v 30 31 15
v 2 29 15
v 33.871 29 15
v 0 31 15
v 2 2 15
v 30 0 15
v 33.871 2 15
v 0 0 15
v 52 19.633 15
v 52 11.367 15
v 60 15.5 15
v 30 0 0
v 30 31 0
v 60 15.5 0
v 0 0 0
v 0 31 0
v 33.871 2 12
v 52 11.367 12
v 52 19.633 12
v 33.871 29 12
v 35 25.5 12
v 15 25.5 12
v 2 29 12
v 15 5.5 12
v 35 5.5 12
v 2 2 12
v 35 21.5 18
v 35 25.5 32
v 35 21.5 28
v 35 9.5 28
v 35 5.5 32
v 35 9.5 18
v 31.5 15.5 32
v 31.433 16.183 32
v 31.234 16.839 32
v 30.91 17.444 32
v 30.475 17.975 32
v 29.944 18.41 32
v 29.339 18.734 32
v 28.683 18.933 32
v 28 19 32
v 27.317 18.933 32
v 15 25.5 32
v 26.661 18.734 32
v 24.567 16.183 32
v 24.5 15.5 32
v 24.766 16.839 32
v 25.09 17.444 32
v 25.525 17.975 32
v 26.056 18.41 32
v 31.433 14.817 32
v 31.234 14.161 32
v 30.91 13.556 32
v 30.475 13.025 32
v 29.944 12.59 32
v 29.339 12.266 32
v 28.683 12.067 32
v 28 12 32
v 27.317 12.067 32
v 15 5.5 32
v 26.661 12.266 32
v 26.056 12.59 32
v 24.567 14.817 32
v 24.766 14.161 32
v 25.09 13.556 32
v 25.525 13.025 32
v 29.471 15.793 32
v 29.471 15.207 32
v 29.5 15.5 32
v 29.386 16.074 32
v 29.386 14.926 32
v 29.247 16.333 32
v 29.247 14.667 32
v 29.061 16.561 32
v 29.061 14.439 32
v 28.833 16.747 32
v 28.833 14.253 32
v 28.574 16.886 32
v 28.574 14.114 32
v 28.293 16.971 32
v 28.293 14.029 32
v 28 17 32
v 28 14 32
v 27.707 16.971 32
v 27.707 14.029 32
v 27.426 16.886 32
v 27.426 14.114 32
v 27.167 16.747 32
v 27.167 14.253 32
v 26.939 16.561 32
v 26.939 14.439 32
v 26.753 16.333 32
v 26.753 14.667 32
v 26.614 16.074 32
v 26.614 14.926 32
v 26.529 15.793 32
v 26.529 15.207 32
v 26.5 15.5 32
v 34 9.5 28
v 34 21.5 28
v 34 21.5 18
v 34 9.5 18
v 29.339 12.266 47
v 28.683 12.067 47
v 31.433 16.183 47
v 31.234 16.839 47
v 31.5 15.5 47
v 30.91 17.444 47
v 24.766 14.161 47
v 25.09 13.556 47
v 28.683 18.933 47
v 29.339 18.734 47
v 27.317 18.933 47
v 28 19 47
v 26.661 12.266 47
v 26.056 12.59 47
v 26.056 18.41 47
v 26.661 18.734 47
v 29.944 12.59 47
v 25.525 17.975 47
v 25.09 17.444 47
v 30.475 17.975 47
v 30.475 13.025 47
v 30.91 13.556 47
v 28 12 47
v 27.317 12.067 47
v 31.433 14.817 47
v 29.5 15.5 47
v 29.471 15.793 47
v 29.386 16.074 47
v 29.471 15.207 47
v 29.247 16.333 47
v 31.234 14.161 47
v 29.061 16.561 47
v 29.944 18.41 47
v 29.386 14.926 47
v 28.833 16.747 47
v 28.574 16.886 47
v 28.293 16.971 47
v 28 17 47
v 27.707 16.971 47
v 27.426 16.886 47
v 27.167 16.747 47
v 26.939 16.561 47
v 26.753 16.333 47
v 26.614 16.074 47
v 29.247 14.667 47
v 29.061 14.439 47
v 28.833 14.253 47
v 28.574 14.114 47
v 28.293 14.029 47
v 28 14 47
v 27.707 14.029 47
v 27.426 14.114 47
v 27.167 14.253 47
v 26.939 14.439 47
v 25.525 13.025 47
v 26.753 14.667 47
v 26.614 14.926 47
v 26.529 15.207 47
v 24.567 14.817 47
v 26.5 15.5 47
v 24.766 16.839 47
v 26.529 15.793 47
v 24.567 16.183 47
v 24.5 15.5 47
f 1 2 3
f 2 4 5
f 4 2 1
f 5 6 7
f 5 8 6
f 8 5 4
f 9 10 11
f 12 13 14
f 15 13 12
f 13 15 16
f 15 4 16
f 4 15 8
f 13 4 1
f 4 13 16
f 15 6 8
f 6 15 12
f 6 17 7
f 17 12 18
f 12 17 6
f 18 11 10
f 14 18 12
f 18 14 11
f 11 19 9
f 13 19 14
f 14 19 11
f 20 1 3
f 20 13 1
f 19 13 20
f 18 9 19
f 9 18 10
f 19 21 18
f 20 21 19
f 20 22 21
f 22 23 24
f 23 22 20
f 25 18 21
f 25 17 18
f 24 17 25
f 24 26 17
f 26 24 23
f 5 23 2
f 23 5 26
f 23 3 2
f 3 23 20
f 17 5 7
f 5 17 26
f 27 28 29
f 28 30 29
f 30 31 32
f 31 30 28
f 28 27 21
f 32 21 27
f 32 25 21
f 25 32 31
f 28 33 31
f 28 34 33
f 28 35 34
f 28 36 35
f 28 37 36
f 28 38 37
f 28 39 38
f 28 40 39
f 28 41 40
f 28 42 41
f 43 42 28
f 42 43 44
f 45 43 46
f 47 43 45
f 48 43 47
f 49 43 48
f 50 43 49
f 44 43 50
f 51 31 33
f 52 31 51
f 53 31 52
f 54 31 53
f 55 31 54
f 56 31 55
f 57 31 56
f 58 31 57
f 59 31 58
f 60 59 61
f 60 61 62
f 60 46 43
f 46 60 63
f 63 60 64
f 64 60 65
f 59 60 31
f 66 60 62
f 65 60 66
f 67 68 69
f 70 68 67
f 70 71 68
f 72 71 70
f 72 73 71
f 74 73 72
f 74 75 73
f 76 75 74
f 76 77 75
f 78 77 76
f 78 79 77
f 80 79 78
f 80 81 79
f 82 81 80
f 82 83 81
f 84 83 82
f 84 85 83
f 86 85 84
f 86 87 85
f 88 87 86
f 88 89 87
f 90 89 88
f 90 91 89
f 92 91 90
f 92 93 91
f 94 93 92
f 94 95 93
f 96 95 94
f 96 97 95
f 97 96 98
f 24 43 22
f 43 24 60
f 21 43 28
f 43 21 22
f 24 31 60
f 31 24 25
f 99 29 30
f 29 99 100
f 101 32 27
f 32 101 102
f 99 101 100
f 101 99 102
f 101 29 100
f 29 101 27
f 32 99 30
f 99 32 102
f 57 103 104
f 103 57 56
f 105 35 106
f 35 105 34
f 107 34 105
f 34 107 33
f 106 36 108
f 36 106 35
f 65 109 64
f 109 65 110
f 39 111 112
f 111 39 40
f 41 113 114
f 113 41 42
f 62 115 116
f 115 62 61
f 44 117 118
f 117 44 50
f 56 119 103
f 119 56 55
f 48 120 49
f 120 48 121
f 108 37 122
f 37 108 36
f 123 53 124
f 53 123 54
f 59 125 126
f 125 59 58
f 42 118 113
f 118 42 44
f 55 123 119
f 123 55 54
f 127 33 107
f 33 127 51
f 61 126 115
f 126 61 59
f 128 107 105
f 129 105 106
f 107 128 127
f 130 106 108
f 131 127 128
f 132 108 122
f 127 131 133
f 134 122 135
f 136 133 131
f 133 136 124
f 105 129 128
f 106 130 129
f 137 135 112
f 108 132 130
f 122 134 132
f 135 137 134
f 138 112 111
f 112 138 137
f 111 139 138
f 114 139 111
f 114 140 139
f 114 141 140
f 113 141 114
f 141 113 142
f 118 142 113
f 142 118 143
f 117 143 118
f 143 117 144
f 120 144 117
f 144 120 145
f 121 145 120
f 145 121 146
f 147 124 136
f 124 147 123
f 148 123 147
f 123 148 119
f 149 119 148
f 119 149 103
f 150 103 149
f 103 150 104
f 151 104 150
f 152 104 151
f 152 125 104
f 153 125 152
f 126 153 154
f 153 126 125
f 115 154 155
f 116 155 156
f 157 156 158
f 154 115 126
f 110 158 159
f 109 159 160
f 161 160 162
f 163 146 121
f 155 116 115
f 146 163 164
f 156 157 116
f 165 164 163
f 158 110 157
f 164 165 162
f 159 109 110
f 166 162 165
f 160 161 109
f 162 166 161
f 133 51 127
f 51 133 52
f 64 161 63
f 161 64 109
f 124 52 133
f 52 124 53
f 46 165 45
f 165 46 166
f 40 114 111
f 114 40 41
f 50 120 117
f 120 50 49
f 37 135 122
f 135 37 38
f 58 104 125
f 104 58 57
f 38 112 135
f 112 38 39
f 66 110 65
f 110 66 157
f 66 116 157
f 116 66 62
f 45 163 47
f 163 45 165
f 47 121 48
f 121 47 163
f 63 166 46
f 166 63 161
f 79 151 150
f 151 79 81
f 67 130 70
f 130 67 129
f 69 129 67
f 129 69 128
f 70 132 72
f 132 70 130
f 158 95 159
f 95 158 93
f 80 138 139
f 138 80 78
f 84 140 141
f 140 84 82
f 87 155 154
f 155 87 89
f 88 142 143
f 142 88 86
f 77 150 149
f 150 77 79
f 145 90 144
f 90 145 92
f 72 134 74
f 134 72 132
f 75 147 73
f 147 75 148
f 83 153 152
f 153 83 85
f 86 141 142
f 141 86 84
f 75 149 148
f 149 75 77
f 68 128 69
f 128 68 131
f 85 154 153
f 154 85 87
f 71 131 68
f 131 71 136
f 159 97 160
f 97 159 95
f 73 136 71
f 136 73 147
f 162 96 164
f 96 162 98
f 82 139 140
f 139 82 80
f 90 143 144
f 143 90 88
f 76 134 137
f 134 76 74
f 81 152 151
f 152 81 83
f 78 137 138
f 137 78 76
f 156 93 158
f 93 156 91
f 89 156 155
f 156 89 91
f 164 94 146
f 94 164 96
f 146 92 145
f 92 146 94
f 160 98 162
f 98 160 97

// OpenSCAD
// 3DBenchy in OpenSCAD

module hull() {
    difference() {
        cube([60, 31, 15]);

        // Taper bow
        translate([30, 0, -1])
            rotate([0, 0, atan2(15.5, 30)])
                translate([0, -20, 0])
                    cube([40, 20, 17]);

        translate([30, 31, -1])
            rotate([0, 0, -atan2(15.5, 30)])
                cube([40, 20, 17]);

        // Deck recess
        translate([2, 2, 12])
            cube([50, 27, 5]);
    }
}

module cabin() {
    difference() {
        translate([15, 5.5, 12])
            cube([20, 20, 20]);

        // Front window
        translate([34, 9.5, 18])
            cube([2, 12, 10]);
    }
}

module chimney() {
    difference() {
        translate([28, 15.5, 32])
            cylinder(h=15, r=3.5, $fn=32);

        translate([28, 15.5, 31])
            cylinder(h=17, r=1.5, $fn=32);
    }
}

union() {
    hull();
    cabin();
    chimney();
}
